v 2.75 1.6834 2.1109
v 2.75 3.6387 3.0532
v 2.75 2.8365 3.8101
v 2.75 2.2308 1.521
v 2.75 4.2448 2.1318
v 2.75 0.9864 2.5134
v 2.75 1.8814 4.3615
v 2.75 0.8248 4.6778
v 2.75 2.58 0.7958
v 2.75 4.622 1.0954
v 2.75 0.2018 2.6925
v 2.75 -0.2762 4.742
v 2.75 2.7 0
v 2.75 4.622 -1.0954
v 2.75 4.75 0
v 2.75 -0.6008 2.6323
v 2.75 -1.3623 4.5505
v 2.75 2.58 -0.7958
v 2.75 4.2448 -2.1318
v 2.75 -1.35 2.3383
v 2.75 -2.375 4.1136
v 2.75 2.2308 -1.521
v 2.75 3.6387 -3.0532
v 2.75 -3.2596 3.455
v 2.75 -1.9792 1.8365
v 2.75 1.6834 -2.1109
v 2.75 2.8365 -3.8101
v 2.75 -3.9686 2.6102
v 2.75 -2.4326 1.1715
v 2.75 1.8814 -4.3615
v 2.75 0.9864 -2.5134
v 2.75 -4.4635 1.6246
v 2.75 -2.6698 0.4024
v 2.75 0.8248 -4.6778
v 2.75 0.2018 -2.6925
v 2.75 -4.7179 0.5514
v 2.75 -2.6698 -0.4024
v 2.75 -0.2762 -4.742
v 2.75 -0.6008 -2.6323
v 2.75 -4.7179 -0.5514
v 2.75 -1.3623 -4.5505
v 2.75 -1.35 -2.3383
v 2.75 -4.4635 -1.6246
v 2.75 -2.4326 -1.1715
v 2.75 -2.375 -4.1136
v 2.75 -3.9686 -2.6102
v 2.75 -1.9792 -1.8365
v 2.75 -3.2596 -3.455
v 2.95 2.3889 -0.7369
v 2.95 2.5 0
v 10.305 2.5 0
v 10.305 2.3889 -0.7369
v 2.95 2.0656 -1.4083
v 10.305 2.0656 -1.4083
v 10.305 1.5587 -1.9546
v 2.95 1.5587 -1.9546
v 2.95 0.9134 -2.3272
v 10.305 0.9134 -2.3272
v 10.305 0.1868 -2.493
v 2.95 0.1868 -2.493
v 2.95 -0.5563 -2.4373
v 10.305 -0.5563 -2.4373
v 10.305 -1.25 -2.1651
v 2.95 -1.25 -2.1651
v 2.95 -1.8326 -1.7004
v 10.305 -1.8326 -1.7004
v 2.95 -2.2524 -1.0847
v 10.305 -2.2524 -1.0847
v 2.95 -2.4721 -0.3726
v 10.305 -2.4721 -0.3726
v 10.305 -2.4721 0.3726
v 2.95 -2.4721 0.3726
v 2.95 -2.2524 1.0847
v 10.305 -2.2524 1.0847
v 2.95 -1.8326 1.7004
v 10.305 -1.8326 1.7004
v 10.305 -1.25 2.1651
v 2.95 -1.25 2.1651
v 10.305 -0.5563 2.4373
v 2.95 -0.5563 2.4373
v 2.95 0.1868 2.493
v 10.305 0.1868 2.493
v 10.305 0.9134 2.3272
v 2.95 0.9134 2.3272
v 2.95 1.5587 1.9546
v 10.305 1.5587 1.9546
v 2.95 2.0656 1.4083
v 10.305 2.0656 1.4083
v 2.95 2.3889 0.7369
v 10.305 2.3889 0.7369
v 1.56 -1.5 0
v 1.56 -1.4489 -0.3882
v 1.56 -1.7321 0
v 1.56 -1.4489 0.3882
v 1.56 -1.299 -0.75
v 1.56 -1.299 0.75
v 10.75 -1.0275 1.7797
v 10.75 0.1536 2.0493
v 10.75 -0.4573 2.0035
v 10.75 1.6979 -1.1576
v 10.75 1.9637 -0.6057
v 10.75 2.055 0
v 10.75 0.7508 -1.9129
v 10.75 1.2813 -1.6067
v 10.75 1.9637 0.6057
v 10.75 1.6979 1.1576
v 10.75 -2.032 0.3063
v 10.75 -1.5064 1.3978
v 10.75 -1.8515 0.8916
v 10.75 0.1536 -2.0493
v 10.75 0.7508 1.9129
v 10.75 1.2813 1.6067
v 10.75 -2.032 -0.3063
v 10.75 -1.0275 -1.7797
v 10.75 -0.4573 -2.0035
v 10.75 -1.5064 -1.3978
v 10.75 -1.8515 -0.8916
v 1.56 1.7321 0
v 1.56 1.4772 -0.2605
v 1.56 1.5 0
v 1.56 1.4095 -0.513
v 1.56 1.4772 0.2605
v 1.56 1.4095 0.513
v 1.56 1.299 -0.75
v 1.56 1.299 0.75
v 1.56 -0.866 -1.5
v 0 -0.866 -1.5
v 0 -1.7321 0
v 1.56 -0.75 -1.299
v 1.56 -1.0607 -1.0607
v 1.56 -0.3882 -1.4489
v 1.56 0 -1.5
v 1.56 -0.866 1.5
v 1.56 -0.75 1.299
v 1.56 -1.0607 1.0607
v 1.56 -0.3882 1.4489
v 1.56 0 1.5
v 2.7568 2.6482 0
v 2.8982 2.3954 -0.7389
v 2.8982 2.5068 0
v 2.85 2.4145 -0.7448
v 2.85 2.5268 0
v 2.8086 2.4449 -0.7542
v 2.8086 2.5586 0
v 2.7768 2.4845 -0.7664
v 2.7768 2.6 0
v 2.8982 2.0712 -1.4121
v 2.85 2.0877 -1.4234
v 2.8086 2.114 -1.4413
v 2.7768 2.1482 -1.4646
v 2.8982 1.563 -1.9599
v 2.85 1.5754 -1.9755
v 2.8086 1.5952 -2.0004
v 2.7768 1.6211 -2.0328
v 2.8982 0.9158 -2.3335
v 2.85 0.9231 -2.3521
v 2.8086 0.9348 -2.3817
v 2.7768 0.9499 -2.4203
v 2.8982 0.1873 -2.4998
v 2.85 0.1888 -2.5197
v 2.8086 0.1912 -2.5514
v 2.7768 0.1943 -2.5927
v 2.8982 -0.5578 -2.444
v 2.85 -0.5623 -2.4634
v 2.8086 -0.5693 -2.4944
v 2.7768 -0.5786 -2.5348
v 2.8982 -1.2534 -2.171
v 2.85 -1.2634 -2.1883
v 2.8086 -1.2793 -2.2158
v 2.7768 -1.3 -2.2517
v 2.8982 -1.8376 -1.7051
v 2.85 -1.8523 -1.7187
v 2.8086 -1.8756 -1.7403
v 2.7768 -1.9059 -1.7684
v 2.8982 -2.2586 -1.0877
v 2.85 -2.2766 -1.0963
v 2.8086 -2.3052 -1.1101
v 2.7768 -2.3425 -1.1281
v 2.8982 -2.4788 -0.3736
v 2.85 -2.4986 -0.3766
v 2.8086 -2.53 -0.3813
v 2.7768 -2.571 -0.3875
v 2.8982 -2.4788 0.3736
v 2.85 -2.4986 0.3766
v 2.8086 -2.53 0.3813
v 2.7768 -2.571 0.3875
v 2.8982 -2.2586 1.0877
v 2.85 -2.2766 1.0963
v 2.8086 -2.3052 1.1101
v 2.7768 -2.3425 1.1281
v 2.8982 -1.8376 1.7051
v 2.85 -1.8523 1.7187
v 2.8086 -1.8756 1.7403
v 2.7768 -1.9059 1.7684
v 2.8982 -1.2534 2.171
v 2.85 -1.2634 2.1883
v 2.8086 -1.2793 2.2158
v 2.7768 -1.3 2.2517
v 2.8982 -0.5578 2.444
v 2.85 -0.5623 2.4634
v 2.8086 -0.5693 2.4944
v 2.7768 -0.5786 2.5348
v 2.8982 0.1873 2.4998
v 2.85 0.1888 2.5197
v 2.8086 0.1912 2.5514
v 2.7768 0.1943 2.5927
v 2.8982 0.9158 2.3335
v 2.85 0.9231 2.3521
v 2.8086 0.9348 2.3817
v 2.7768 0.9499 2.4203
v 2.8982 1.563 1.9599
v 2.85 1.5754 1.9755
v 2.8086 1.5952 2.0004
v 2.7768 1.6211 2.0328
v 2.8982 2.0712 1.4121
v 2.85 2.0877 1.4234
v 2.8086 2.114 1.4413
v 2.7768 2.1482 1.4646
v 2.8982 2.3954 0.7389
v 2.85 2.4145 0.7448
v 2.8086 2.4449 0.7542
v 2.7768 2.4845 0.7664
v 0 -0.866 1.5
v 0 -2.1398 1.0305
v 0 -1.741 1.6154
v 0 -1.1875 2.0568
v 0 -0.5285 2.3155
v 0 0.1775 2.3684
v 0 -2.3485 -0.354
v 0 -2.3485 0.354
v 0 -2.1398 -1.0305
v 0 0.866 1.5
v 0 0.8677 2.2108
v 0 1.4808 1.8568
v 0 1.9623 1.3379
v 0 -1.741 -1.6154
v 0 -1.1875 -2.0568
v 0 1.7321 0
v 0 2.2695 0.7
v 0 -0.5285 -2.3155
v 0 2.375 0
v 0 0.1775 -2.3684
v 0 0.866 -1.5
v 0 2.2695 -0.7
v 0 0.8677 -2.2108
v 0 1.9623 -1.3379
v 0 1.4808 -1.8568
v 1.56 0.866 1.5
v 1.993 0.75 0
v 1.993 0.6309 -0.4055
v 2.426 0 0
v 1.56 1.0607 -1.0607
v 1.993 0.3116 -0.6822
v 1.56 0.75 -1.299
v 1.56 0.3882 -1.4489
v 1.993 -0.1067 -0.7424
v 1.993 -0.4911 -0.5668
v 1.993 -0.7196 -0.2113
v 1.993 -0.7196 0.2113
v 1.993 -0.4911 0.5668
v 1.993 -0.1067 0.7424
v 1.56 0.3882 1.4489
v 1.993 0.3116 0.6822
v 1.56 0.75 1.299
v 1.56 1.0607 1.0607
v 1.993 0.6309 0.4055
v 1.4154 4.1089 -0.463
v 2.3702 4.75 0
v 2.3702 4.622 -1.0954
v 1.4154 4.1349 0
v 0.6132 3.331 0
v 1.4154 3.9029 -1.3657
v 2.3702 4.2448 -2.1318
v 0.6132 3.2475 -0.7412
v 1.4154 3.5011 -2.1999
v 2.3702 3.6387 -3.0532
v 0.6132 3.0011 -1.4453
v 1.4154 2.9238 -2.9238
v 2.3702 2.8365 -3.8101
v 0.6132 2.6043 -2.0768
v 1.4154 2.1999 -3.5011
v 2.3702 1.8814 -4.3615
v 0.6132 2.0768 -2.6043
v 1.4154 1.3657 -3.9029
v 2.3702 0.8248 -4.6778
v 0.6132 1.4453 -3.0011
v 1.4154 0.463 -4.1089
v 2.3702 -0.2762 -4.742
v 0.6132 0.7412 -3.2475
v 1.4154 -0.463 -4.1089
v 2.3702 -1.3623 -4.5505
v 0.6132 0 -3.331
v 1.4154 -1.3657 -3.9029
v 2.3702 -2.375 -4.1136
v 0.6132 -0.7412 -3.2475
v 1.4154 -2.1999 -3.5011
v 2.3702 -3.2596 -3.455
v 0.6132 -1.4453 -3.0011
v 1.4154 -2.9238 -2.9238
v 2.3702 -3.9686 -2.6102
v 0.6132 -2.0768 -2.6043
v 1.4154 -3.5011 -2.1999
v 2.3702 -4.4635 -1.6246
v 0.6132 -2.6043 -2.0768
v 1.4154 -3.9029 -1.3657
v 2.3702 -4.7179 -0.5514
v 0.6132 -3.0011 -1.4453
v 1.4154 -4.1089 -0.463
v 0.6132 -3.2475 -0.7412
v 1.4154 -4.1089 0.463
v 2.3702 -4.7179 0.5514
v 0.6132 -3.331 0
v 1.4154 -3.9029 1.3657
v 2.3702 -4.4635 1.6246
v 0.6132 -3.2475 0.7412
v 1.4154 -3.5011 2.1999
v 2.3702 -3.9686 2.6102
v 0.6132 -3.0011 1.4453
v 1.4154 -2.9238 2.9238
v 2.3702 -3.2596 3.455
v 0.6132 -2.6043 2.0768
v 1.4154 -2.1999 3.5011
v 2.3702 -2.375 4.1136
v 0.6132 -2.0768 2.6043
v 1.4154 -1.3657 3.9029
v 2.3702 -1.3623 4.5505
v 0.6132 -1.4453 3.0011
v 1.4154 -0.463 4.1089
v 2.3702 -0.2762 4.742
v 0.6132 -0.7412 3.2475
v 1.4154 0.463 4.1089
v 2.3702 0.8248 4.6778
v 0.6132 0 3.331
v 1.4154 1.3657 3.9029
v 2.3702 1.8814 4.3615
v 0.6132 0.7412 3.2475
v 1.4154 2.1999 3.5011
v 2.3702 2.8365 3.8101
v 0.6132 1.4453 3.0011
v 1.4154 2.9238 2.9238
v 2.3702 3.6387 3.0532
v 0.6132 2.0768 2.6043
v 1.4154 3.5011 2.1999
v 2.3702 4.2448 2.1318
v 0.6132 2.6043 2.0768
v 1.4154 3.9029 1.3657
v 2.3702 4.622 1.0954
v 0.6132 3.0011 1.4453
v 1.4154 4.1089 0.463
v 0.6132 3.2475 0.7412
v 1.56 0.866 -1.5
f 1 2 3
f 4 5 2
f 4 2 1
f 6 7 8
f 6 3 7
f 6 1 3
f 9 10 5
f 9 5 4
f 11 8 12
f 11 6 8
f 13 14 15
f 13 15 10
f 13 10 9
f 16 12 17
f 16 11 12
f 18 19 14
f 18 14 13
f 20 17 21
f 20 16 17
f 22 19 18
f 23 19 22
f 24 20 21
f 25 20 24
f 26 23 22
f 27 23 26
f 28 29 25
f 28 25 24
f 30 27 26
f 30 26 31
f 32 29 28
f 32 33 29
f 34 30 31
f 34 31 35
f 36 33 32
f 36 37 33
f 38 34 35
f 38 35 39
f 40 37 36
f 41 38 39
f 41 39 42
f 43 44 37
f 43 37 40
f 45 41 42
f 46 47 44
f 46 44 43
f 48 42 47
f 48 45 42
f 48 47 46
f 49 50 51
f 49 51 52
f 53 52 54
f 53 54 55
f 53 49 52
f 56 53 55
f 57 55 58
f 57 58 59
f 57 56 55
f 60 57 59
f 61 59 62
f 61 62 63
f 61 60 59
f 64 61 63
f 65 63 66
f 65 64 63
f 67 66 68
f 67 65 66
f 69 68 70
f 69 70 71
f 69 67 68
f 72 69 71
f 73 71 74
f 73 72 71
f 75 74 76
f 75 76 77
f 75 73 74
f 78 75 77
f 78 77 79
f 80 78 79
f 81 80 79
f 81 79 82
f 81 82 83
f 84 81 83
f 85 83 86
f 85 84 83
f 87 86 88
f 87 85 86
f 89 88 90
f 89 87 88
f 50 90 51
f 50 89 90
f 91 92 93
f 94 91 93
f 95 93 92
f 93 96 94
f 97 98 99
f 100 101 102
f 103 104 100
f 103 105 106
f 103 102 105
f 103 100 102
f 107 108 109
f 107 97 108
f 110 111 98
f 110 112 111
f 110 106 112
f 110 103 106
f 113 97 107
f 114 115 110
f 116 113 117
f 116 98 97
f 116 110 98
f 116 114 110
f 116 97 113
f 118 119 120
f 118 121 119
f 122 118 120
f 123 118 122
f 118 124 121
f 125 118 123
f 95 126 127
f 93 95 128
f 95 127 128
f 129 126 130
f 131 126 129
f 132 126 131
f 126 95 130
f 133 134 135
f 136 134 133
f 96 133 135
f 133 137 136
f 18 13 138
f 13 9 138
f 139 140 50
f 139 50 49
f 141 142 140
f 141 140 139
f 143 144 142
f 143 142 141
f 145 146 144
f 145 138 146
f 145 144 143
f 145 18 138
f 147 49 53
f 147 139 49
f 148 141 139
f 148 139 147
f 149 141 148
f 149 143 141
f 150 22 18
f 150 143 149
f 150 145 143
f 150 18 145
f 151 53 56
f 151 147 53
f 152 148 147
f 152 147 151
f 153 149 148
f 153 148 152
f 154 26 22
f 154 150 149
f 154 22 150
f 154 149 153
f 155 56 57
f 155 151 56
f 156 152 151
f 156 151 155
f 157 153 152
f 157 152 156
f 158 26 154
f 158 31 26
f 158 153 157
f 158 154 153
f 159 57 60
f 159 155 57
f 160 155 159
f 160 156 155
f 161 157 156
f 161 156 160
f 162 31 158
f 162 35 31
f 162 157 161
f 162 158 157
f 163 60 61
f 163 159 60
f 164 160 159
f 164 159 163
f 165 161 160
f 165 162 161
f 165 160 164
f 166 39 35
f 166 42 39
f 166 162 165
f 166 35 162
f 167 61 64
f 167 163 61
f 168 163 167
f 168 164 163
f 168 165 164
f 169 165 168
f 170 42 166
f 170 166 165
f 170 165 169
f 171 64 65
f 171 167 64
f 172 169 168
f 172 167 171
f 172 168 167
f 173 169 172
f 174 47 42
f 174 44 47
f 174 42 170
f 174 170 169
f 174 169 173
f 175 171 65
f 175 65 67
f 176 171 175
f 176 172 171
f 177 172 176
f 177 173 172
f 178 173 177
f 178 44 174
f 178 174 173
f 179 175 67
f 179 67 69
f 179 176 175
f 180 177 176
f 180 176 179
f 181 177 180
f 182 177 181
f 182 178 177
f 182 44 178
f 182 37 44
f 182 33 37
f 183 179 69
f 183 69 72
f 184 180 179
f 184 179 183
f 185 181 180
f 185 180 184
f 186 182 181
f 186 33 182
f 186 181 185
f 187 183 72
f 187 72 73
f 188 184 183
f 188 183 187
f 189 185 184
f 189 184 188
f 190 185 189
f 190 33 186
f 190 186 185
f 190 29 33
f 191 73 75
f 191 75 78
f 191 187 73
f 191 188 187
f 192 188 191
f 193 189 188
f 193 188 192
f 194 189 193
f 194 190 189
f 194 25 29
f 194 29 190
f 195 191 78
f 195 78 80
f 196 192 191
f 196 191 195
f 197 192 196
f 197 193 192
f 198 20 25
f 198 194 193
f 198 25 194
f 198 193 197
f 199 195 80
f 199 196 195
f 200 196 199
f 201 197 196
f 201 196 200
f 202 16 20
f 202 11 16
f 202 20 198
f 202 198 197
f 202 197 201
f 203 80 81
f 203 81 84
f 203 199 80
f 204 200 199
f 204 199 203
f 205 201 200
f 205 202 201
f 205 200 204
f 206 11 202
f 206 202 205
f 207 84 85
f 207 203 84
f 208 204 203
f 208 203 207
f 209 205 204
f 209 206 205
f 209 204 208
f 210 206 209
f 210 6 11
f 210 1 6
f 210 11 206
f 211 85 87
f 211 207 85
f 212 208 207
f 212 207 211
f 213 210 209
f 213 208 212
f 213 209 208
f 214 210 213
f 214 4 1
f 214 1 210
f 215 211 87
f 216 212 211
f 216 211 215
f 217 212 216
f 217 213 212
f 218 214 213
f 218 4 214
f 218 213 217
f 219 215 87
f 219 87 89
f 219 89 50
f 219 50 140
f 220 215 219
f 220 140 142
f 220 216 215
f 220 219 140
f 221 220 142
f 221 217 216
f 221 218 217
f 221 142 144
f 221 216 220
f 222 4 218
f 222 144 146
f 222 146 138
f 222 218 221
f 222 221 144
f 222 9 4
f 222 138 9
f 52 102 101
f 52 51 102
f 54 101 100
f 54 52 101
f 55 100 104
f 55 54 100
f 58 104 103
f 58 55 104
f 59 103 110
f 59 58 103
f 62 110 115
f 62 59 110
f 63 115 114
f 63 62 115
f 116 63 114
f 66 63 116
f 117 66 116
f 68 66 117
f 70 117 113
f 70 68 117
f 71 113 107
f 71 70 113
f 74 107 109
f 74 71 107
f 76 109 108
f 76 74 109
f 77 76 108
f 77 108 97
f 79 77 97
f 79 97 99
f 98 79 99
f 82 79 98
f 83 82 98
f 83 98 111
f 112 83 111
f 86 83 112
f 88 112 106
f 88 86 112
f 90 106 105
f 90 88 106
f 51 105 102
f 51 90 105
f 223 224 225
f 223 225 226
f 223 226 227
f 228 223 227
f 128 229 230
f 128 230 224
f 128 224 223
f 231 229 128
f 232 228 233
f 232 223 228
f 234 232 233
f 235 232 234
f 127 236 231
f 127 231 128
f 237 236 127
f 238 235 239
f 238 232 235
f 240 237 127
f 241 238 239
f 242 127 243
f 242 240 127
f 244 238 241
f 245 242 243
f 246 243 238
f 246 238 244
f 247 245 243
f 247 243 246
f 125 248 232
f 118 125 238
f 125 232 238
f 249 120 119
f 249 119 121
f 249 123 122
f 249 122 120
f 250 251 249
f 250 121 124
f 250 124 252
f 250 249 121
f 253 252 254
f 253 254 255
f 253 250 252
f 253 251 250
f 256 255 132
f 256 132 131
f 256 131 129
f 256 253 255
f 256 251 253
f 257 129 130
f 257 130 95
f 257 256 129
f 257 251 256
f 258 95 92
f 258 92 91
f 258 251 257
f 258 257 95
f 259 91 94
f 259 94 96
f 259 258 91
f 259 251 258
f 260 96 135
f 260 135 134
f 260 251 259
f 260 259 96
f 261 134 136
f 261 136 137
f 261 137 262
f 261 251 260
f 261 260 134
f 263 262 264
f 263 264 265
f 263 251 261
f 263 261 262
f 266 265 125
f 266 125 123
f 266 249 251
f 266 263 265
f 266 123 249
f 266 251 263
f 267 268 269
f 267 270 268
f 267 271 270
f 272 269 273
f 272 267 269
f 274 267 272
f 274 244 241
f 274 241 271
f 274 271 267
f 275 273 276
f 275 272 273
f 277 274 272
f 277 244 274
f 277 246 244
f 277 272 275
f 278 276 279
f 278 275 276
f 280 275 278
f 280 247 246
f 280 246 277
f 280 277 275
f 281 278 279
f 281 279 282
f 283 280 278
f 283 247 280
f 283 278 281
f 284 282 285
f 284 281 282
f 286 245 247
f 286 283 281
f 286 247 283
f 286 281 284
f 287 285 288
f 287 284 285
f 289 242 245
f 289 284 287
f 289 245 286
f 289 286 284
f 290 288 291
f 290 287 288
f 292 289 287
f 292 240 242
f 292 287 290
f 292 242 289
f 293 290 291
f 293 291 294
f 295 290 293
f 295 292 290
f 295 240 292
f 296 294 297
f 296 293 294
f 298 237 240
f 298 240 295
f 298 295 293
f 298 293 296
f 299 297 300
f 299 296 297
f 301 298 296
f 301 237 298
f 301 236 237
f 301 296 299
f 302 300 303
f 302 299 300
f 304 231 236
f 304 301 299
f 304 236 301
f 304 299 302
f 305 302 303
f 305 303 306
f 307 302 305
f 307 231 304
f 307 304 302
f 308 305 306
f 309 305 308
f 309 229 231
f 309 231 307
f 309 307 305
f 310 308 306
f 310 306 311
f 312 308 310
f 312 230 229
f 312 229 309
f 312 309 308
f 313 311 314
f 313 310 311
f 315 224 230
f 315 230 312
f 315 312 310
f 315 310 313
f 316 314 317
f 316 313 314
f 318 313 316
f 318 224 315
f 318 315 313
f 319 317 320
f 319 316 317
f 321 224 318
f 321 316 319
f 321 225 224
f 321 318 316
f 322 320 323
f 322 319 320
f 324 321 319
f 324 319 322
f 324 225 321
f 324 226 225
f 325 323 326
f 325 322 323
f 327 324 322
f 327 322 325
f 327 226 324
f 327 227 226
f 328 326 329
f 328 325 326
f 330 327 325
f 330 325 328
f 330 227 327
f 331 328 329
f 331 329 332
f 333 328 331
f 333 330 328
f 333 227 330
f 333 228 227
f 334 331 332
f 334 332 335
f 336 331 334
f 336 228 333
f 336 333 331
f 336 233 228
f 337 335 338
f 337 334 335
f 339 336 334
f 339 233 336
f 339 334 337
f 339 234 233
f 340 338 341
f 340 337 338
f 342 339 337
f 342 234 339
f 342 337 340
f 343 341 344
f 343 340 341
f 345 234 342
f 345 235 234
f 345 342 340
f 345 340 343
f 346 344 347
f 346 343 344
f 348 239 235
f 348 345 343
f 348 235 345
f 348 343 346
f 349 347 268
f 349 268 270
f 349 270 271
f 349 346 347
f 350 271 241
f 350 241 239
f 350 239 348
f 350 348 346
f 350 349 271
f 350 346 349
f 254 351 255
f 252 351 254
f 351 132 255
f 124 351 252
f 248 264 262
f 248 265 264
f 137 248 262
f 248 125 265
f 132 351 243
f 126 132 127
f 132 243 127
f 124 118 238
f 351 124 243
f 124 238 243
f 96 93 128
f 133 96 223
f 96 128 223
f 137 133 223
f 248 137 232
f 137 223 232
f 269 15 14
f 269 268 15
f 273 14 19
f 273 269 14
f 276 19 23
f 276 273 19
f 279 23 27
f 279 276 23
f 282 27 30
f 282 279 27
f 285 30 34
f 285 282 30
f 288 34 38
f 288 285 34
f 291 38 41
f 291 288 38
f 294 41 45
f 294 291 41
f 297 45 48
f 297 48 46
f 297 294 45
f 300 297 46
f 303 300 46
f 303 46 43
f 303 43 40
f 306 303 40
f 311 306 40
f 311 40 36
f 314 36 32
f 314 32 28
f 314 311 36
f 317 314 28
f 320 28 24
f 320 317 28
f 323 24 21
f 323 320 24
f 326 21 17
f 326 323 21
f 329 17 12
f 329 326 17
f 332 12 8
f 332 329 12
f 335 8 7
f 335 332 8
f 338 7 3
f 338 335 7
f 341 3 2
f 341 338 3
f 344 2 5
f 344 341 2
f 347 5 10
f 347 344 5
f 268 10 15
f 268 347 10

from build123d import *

# Parameters (mm, degrees)
CHAMFER_2_R = 0.2
HEX_2_DEPTH = 1.56


with BuildPart() as part:
    # Эскиз1 → Body (revolve)
    with BuildSketch(Plane.XY):
        with BuildLine():
            Line((0, 2.375), (0, 0))
            Line((0, 0), (10.75, 0))
            Line((10.75, 0), (10.75, 2.055))
            Line((10.75, 2.055), (10.305, 2.5))
            Line((10.305, 2.5), (2.75, 2.5))
            Line((2.75, 2.5), (2.75, 4.75))
            Line((2.75, 4.75), (2.370164642, 4.75))
            ThreePointArc((2.370164642, 4.75), (0.992749859, 3.754440885), (0, 2.375))
        make_face()
    revolve(axis=Axis((-3.643489966, 0, 0), (-1, 0, 0)))

    # Chamfer 2
    chamfer_2_edges = [part.edges().sort_by_distance(p)[0] for p in [
        (2.75, -2.5, 0),
    ]]
    fillet(chamfer_2_edges, radius=CHAMFER_2_R)

    # Эскиз2 → Hole (revolve, cut)
    with BuildSketch(Plane.XY):
        Polygon((0, 0), (0, 1.5), (1.56, 1.5), (2.426025404, 0), align=None)
    revolve(axis=Axis((2.426025404, 0, 0), (-1, 0, 0)), mode=Mode.SUBTRACT)

    # Эскиз3 → Hex 2 (cut)
    with BuildSketch(Plane.ZY):
        Polygon((-1.5, -0.866025404), (0, -1.732050808), (1.5, -0.866025404), (1.5, 0.866025404), (0, 1.732050808), (-1.5, 0.866025404), align=None)
    extrude(amount=-HEX_2_DEPTH, mode=Mode.SUBTRACT)


solid = part.part
